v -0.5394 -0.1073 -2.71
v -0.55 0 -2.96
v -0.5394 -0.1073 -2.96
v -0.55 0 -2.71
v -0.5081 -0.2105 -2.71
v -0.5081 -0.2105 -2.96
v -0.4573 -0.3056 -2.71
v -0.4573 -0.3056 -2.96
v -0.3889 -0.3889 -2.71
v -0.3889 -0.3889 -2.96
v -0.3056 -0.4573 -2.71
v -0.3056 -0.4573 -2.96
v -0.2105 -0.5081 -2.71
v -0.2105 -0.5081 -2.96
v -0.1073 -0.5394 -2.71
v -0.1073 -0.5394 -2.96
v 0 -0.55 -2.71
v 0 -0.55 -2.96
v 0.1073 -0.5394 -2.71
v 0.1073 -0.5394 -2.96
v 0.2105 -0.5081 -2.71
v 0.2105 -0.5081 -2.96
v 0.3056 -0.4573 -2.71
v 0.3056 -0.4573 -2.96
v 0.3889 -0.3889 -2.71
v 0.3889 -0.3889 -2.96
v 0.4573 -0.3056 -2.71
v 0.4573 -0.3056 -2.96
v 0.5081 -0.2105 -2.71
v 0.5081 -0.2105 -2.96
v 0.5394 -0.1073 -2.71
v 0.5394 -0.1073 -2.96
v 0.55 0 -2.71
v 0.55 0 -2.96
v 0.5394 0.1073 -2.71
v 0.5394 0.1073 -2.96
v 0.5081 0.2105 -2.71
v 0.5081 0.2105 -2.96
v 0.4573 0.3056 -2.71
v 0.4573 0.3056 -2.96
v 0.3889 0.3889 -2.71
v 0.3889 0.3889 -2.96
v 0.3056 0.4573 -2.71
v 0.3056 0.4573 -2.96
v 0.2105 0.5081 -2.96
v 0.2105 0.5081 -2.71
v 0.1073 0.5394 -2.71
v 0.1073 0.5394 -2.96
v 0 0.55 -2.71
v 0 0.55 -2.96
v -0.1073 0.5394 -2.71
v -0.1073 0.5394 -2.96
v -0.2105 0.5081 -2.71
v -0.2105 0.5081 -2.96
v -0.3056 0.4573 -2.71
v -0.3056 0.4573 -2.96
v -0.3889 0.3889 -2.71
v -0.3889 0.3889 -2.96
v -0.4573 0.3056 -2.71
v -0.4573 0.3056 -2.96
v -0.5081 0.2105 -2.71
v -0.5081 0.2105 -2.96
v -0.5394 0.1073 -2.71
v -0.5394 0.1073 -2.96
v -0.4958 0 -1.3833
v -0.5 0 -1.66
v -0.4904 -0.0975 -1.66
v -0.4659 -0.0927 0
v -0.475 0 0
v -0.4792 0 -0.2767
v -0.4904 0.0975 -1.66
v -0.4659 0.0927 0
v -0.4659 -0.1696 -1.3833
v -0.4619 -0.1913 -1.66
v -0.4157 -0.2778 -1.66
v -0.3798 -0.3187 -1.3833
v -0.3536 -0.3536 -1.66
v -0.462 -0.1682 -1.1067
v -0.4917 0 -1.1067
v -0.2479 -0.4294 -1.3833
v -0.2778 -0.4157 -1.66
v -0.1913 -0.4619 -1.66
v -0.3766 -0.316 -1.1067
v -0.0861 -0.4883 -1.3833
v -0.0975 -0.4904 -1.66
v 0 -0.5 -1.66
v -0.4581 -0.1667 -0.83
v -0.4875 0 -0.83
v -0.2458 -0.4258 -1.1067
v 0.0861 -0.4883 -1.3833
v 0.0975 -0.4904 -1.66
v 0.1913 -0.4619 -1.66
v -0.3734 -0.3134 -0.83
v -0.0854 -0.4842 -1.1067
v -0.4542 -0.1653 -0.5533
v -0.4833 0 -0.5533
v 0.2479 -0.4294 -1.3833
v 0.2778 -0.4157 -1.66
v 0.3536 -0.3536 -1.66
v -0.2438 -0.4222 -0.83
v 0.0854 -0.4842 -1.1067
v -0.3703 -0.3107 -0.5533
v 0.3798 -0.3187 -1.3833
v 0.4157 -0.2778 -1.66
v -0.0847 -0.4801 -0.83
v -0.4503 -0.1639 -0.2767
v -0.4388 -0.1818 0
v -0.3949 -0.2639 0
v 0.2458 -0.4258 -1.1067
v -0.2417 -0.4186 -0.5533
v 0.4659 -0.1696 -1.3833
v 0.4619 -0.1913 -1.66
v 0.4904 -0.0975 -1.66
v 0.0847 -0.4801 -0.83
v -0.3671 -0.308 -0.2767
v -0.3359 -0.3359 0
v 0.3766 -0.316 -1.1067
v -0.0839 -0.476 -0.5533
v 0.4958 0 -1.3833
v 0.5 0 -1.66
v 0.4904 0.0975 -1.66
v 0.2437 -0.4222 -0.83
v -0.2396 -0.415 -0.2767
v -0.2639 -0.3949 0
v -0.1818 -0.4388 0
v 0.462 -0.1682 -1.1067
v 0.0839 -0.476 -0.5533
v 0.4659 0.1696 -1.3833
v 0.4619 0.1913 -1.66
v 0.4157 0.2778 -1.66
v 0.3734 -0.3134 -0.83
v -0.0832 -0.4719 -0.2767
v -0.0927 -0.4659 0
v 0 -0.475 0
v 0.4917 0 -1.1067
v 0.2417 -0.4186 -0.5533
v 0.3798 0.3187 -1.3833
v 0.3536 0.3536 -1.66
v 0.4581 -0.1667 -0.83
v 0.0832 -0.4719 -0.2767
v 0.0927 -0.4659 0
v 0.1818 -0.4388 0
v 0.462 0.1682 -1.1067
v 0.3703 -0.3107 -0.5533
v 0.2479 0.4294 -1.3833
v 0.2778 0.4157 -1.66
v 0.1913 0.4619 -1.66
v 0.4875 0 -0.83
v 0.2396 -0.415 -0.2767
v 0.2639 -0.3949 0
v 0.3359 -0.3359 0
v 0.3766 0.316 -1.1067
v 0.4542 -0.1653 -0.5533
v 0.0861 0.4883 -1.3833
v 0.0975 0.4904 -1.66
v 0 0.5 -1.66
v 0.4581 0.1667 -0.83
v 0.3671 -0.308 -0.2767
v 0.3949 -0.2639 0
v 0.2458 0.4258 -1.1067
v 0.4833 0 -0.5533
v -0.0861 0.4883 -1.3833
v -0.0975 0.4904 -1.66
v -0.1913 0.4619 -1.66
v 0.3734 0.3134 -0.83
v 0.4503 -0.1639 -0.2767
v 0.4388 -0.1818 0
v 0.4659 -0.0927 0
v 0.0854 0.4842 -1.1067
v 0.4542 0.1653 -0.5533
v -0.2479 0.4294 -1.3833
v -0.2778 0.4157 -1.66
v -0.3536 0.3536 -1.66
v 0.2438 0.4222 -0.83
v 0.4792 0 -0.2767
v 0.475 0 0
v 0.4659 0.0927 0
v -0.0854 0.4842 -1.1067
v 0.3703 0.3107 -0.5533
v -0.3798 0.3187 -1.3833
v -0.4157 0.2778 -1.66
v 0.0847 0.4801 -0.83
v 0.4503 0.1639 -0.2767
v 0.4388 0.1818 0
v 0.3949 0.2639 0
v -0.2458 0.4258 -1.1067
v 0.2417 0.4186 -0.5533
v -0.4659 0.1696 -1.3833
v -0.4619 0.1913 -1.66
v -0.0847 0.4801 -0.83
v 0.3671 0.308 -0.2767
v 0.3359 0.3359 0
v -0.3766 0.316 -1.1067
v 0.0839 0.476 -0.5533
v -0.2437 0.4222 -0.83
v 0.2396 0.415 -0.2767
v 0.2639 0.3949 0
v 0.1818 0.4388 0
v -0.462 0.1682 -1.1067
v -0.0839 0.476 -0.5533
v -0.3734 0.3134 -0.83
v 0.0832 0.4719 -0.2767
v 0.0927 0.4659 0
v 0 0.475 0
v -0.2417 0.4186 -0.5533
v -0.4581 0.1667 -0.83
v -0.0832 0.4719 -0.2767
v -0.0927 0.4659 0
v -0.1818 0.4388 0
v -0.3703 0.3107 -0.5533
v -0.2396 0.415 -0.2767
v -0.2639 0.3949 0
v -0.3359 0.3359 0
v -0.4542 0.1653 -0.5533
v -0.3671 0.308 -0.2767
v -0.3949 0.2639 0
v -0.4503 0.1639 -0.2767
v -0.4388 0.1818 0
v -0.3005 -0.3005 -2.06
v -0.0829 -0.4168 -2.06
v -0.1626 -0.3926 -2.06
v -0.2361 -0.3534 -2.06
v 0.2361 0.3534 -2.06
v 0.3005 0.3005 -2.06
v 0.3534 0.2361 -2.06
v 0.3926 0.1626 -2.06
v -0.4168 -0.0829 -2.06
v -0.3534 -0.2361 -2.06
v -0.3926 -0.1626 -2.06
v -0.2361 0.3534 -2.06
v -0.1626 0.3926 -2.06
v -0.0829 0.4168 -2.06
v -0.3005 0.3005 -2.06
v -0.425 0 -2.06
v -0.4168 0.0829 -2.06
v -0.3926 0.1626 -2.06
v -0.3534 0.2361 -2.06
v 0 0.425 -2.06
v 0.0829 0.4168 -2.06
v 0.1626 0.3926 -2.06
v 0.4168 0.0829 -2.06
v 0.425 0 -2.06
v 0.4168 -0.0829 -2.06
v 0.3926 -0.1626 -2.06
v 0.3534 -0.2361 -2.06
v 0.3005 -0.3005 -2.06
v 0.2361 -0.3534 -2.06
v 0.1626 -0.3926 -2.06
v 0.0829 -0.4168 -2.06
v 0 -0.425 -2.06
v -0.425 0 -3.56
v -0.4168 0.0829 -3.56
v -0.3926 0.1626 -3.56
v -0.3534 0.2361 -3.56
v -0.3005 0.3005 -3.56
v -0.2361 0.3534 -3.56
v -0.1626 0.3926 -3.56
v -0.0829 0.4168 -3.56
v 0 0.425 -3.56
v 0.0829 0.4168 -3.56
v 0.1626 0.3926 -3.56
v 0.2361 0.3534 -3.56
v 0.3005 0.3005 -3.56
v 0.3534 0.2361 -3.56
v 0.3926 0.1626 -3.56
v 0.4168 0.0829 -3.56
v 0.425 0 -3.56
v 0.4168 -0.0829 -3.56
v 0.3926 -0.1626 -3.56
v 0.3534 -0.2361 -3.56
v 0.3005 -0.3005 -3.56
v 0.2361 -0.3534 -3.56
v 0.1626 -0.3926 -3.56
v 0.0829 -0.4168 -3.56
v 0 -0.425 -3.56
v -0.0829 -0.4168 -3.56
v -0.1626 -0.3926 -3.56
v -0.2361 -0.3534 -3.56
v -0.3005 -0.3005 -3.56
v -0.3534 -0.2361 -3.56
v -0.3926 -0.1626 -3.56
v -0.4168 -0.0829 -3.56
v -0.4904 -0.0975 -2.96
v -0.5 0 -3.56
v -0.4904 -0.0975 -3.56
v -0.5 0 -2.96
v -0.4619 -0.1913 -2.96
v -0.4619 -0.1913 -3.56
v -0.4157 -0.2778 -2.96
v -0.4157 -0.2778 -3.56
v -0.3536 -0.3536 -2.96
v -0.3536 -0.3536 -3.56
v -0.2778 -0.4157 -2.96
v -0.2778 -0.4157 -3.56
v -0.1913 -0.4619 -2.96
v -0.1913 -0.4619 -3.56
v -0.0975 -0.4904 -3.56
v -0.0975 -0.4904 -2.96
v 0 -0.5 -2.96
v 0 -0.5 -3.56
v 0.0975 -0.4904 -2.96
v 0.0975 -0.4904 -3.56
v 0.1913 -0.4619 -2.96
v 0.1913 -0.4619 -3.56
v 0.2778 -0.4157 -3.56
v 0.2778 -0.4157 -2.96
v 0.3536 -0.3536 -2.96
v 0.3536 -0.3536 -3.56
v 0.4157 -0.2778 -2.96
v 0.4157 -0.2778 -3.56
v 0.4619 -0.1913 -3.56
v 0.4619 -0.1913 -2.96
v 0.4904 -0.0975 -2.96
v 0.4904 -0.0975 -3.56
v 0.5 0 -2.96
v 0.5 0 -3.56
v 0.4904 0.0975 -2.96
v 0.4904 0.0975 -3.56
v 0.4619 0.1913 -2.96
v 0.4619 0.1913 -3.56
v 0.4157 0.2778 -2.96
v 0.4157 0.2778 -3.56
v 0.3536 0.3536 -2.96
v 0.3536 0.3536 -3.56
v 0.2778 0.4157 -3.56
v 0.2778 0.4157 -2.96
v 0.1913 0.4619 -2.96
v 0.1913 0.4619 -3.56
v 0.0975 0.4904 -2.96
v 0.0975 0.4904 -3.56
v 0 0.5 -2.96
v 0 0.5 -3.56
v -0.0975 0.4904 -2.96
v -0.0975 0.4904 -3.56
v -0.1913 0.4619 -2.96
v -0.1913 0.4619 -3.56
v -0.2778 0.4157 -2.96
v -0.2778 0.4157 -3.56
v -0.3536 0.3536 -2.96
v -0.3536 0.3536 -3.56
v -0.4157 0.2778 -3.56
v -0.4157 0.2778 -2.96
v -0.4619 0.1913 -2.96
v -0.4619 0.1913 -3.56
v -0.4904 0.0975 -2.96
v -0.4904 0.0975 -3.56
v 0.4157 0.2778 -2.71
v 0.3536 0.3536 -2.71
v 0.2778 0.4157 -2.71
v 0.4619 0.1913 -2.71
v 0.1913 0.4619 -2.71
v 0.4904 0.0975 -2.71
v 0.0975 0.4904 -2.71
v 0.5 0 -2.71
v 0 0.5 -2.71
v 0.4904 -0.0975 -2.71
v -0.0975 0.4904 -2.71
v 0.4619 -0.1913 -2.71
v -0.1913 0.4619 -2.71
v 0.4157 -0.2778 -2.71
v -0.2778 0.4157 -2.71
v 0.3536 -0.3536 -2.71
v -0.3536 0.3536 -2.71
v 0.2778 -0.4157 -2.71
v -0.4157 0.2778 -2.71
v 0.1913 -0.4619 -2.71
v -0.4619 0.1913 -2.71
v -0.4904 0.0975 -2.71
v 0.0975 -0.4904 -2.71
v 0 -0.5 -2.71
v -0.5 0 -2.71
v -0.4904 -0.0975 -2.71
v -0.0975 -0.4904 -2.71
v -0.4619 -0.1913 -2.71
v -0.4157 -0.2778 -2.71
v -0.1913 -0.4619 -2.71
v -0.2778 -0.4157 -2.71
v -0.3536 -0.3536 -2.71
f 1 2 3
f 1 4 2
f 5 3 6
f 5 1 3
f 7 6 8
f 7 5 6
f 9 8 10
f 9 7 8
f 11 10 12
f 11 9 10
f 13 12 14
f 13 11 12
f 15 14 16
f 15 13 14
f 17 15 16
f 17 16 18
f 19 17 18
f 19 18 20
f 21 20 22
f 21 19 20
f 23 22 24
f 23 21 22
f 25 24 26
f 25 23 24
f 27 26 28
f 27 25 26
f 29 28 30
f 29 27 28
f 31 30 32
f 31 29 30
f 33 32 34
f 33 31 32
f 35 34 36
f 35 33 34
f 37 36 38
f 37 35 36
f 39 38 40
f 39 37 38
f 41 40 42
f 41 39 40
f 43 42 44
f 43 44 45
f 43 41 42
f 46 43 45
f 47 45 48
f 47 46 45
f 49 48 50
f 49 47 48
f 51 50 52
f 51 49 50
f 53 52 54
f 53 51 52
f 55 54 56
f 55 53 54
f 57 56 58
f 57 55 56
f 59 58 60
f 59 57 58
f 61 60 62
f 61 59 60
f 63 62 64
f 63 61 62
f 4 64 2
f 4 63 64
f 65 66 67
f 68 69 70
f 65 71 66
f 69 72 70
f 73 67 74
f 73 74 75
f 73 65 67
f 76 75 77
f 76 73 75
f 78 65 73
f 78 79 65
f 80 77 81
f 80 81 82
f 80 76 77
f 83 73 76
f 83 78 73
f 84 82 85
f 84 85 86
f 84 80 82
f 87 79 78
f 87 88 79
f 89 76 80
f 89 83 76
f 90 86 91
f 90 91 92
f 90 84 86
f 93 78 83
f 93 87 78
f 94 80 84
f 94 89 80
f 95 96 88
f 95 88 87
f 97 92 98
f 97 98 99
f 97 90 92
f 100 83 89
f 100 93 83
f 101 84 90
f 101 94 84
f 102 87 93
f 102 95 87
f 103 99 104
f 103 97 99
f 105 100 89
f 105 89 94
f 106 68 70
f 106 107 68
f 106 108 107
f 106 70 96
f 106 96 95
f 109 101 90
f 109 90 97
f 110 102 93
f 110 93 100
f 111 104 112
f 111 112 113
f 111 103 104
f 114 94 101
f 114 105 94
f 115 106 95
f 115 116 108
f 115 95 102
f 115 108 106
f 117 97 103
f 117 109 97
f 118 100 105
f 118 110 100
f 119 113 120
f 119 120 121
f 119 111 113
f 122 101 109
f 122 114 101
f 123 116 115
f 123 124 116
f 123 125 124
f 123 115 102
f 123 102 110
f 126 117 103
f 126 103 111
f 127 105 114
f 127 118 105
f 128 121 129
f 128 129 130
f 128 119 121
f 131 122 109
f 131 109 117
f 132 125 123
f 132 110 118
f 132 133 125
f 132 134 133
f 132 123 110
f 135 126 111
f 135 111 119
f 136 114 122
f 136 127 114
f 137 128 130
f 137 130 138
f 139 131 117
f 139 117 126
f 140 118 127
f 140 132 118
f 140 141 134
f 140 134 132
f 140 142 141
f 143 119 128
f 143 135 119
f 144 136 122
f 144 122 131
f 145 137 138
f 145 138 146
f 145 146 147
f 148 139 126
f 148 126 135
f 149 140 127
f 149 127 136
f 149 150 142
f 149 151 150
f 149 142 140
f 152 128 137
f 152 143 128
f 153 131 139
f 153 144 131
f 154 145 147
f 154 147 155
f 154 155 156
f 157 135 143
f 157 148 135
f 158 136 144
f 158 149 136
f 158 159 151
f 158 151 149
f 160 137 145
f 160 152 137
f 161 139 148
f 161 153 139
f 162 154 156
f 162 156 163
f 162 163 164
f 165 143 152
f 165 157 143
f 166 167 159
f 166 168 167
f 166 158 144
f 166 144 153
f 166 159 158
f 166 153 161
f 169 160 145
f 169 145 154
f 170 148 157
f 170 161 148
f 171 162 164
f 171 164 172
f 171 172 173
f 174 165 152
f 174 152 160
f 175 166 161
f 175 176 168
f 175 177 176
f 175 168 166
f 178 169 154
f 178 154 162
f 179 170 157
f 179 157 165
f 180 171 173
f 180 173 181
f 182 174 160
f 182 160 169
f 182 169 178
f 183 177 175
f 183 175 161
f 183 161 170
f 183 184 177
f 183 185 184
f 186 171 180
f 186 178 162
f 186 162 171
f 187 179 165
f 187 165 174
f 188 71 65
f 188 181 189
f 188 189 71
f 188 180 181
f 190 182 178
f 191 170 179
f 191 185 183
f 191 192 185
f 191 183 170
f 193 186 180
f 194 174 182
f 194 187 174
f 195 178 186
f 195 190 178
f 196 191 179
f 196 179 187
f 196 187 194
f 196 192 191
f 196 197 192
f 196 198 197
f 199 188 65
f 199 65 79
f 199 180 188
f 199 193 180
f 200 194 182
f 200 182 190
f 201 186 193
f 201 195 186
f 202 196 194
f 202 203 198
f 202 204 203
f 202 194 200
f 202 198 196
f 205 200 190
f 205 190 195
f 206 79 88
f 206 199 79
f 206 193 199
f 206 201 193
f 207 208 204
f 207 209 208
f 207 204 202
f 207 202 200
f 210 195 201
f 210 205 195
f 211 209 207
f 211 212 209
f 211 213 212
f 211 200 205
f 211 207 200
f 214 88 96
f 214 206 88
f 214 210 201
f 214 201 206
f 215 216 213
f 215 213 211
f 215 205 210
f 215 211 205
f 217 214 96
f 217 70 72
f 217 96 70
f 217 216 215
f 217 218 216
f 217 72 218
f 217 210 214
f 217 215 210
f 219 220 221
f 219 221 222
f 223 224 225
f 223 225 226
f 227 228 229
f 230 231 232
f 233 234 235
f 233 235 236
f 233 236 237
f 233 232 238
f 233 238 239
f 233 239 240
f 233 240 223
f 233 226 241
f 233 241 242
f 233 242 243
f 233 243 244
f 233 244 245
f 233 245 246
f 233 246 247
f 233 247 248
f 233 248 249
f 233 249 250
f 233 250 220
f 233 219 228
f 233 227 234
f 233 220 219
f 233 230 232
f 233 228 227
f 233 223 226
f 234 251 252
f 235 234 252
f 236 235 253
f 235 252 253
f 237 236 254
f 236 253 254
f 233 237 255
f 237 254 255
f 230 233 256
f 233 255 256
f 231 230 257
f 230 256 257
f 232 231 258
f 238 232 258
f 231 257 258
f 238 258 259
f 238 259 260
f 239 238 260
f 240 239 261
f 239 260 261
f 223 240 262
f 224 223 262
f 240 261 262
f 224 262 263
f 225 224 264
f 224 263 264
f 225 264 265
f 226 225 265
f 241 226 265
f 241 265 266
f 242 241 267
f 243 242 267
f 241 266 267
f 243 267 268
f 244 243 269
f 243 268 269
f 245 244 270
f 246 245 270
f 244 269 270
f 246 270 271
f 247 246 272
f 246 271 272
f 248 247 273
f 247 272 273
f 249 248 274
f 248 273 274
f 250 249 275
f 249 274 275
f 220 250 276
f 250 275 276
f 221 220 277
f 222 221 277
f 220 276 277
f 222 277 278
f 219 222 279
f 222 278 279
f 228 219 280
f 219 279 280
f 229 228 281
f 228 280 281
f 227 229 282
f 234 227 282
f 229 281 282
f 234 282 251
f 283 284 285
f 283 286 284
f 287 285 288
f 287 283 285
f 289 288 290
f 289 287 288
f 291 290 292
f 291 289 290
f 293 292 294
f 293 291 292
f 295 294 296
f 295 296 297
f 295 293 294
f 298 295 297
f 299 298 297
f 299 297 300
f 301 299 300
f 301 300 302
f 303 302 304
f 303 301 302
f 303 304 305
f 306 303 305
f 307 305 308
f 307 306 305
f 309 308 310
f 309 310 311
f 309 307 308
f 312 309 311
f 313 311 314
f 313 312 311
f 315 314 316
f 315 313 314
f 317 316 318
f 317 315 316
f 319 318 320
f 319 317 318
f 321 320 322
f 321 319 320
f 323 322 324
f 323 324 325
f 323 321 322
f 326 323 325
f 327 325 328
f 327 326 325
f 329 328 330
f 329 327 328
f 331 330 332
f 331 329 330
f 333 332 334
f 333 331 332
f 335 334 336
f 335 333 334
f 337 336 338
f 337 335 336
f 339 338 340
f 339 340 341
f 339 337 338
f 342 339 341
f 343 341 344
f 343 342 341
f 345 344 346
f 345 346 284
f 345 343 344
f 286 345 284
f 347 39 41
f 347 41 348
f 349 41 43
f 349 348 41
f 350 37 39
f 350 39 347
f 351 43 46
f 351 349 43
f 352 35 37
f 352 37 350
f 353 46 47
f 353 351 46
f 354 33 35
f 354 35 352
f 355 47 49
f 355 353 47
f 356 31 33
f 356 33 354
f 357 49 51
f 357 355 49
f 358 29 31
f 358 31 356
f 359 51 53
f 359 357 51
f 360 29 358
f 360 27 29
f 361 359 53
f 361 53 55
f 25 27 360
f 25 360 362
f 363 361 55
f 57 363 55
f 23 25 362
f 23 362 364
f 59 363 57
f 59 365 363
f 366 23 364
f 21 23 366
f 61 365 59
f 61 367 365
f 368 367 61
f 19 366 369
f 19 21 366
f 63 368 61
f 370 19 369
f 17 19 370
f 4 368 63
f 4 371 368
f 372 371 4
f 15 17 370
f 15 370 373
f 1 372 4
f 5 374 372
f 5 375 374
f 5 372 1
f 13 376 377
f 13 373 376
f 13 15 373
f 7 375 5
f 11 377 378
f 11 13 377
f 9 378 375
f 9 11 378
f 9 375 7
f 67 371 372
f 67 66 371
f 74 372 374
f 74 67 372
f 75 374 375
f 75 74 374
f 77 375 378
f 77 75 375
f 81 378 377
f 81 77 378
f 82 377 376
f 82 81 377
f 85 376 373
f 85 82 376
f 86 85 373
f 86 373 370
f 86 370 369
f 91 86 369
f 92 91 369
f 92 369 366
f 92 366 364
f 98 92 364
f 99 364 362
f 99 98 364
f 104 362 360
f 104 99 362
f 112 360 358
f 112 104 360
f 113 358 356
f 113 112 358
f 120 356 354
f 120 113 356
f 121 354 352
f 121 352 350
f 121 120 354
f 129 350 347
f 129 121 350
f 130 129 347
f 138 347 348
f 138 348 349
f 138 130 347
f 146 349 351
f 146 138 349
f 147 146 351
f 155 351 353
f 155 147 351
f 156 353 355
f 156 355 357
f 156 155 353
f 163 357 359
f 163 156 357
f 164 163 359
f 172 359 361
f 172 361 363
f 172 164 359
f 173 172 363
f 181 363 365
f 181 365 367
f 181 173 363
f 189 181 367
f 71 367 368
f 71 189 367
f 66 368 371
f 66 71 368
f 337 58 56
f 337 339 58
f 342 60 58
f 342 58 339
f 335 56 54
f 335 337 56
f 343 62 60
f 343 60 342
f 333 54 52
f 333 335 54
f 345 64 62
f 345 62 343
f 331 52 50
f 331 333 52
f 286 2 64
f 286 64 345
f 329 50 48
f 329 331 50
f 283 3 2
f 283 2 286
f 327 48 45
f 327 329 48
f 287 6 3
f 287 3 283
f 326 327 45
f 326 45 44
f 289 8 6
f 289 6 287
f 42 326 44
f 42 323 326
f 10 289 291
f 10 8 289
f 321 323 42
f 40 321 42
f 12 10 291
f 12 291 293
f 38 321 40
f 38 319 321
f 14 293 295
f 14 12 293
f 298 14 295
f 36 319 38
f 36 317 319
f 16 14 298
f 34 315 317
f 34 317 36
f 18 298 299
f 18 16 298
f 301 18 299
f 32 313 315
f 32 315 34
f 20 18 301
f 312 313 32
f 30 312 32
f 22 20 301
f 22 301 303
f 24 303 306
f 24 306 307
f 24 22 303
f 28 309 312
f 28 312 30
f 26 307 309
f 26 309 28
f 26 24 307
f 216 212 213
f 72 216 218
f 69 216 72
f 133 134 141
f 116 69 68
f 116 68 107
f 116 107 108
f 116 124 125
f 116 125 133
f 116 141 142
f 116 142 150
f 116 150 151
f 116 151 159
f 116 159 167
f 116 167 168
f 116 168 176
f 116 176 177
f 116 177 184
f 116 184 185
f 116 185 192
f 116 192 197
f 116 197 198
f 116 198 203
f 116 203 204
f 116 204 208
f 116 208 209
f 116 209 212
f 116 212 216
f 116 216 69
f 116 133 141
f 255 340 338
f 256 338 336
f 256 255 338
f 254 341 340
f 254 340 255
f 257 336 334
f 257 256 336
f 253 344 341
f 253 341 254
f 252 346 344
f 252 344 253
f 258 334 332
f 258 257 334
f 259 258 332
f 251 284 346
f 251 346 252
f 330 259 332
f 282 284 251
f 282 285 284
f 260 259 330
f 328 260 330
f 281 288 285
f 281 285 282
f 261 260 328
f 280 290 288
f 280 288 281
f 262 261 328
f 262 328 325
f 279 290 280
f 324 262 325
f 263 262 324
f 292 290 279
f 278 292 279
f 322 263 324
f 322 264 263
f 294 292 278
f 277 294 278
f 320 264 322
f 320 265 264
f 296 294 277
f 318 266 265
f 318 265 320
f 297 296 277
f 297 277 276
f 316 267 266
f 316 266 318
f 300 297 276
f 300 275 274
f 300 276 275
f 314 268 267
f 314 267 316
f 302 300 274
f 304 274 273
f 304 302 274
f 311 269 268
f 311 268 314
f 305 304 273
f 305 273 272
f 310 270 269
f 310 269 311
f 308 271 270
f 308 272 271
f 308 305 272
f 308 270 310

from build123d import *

# Parameters (mm, degrees)
SKETCH2_R          = 0.425
CUT_EXTRUDE1_DEPTH = 1.5


with BuildPart() as part:
    # Sketch1 → Revolve1 (revolve)
    with BuildSketch(Plane(origin=(0, 0, 0), x_dir=(1, 0, 0), z_dir=(0, 1, 0))):
        Polygon((0, 3.56), (-0.5, 3.56), (-0.5, 2.96), (-0.55, 2.96), (-0.55, 2.71), (-0.5, 2.71), (-0.5, 1.66), (-0.475, 0), (0, 0), align=None)
    revolve(axis=Axis((0, 0, -1.599810873), (0, 0, 1)))

    # Sketch2 → Cut-Extrude1 (cut)
    with BuildSketch(Plane(origin=(0, 0, -3.56), x_dir=(-1, 0, 0), z_dir=(0, 0, -1))):
        Circle(SKETCH2_R)
    extrude(amount=-CUT_EXTRUDE1_DEPTH, mode=Mode.SUBTRACT)


solid = part.part
